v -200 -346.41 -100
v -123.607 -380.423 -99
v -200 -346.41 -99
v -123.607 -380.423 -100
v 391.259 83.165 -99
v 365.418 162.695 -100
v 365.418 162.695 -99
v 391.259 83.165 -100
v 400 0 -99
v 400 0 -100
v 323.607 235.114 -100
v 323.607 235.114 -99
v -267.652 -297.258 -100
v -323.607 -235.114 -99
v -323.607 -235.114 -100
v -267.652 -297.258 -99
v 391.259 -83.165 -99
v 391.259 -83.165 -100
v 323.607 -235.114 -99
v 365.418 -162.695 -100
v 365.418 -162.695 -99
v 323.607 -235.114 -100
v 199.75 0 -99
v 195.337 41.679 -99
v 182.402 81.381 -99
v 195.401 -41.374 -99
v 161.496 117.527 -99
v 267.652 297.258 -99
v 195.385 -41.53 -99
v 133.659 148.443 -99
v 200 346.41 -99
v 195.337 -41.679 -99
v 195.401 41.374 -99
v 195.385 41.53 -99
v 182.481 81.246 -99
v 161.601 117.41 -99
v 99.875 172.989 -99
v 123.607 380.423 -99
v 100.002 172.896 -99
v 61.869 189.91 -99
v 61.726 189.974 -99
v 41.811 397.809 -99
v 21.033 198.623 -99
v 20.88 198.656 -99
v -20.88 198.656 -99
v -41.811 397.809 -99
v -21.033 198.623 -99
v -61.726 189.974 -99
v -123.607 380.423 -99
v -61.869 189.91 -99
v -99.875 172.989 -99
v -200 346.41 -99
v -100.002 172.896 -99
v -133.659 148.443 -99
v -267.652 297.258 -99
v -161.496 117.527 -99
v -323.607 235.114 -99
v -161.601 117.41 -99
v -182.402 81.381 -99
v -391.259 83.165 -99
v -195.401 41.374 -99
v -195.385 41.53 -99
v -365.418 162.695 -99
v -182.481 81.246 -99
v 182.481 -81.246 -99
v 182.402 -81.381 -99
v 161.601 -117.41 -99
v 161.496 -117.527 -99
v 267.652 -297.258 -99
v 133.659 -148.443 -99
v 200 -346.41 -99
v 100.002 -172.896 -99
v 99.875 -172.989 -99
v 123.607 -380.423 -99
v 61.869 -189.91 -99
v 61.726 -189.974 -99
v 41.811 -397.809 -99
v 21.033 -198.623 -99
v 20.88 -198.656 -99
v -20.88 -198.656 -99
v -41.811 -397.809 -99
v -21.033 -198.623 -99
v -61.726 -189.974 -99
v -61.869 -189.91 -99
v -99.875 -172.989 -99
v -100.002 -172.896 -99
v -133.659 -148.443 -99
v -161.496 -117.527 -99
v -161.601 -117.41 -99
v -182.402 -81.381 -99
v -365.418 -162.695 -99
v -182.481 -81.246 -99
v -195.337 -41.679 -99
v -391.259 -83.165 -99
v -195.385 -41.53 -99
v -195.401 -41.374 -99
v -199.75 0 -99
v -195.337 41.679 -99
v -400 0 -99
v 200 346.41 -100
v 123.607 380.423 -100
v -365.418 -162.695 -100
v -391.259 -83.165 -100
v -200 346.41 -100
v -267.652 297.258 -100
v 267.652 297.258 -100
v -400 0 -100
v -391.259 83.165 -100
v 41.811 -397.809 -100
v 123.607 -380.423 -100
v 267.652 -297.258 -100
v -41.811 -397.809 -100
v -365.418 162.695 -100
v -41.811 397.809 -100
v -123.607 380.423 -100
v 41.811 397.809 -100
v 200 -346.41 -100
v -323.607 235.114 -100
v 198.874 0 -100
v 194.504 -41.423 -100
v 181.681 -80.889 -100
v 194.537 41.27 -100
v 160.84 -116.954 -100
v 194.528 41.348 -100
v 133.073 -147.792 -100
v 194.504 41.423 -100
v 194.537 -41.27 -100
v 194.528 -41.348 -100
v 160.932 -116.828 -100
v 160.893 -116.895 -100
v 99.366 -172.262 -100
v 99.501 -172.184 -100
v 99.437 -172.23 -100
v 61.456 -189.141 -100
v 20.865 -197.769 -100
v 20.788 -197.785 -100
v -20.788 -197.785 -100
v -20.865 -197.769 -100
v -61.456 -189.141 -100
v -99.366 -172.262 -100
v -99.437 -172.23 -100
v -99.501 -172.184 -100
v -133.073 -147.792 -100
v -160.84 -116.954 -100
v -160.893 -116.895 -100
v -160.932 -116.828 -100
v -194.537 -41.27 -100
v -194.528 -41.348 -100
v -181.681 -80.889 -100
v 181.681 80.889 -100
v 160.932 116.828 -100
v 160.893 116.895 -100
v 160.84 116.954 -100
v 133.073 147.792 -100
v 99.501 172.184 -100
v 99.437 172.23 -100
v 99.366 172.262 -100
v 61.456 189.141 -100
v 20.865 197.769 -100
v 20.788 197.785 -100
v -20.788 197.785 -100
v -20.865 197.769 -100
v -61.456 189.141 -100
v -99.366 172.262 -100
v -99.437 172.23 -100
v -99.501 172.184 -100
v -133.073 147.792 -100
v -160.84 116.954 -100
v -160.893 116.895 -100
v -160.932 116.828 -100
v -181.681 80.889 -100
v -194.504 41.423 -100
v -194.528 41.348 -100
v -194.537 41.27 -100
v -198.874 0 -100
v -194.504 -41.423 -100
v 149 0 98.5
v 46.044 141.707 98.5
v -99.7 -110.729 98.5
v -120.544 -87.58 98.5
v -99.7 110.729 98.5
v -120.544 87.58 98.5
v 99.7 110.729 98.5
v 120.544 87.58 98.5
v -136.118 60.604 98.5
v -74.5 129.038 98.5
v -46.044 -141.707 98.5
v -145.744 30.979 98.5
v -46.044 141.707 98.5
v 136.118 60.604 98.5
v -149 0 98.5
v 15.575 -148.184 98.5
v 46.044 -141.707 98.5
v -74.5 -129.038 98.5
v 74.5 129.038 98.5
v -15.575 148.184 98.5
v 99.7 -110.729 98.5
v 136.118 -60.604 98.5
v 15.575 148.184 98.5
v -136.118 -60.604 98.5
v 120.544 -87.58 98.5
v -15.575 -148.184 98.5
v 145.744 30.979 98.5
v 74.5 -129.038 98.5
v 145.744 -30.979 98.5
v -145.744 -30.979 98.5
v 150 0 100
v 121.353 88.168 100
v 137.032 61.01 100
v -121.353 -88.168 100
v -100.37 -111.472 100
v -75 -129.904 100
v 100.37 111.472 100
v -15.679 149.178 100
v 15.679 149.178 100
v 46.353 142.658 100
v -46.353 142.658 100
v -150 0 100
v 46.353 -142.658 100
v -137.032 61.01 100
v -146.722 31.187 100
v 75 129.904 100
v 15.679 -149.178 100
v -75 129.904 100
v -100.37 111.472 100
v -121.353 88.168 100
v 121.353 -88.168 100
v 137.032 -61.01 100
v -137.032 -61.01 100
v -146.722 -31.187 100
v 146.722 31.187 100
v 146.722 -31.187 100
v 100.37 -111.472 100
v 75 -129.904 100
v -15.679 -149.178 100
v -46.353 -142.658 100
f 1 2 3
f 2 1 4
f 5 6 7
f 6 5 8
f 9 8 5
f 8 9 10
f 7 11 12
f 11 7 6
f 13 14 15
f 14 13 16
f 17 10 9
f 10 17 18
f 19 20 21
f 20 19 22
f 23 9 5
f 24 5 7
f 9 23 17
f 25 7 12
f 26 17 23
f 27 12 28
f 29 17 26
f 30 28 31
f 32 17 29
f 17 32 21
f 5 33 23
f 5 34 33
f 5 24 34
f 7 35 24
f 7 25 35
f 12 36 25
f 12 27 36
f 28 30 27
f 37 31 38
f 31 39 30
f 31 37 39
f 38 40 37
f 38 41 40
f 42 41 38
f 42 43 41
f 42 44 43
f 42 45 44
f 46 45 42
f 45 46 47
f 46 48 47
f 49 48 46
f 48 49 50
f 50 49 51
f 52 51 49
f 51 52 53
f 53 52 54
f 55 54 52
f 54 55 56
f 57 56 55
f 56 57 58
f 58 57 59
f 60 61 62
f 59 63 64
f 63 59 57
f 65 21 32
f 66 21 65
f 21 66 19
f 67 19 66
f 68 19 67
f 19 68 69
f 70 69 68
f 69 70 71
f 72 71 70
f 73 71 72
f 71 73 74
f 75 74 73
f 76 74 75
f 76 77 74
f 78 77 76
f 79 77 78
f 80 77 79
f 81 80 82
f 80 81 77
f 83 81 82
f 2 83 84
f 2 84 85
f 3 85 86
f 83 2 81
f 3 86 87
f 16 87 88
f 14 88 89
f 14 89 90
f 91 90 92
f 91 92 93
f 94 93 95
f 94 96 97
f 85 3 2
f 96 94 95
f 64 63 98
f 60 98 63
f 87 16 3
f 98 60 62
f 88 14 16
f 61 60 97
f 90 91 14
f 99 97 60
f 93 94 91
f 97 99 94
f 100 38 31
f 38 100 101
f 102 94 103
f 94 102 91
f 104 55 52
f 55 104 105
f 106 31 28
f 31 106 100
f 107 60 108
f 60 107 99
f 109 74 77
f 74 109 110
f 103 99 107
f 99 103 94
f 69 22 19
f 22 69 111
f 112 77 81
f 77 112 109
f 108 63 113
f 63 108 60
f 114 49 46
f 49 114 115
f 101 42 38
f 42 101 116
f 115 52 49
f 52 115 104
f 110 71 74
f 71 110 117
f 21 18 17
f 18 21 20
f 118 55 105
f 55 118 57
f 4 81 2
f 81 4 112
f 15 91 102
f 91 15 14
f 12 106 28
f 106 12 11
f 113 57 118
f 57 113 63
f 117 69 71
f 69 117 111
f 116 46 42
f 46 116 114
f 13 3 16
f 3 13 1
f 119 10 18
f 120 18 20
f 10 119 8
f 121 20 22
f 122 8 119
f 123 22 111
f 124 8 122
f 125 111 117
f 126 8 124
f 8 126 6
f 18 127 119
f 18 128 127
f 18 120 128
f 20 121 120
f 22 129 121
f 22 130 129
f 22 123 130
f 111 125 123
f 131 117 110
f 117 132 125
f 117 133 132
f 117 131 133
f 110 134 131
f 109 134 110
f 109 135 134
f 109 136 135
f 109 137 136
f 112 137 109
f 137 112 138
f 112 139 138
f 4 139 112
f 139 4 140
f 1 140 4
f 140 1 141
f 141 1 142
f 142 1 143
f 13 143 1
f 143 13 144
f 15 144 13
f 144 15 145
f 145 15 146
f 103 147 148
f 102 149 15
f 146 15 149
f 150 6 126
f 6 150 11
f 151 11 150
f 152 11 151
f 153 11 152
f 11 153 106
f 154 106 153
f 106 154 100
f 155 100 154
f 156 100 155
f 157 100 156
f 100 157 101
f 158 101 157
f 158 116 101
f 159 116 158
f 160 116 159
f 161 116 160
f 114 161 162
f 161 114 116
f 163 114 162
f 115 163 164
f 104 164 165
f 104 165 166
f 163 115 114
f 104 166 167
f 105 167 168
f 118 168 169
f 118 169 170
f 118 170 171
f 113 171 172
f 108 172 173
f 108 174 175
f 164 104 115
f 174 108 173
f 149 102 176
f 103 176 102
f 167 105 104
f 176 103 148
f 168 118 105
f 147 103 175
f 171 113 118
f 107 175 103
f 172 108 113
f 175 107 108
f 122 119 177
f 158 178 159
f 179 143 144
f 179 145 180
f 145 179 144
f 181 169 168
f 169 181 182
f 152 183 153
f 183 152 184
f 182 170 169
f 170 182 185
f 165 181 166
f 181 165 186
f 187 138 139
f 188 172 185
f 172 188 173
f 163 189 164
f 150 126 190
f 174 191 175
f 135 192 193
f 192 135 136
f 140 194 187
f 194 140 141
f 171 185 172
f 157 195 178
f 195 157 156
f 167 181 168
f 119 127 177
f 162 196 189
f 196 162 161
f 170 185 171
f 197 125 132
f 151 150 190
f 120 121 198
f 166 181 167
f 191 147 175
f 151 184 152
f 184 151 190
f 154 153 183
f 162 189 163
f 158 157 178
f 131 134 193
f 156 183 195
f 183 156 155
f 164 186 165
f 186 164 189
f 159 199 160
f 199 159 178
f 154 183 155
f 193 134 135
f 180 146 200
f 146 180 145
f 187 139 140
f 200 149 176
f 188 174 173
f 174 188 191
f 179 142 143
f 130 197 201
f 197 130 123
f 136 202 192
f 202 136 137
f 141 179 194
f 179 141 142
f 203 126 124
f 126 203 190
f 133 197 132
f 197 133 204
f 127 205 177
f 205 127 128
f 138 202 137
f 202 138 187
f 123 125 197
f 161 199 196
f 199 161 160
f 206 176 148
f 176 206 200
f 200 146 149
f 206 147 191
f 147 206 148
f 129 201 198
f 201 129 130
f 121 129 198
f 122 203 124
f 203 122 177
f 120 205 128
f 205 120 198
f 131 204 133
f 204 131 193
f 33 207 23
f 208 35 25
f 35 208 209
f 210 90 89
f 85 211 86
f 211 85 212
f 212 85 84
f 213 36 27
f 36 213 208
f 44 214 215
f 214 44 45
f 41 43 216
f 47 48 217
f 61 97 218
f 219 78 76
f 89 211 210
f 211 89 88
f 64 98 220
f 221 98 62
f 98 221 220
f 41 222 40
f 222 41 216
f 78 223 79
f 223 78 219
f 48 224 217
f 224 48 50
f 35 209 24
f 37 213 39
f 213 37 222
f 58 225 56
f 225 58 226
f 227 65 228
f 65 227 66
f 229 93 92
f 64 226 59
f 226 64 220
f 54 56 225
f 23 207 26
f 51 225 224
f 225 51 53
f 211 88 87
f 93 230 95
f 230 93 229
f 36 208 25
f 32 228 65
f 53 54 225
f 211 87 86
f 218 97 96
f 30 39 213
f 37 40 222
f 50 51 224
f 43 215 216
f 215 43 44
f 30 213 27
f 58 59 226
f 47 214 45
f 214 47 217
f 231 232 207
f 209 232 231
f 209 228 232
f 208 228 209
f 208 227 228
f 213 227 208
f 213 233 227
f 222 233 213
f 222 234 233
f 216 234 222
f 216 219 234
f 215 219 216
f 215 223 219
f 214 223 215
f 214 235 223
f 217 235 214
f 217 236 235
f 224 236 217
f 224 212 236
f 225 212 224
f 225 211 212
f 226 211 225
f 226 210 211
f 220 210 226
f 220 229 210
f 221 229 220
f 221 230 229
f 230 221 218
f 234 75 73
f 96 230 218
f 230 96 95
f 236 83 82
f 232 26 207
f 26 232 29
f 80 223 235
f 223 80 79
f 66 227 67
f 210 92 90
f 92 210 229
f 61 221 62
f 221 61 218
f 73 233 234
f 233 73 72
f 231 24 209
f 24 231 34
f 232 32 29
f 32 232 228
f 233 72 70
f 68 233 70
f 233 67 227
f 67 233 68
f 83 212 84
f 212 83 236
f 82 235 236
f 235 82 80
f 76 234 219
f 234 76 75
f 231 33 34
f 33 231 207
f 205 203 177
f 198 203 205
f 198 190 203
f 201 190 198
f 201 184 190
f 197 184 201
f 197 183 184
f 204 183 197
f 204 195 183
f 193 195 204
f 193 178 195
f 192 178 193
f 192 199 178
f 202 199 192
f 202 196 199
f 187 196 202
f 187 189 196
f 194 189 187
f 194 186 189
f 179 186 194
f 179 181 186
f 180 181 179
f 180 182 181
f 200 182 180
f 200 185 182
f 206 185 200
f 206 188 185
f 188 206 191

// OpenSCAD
height=200;
bottomRadius=200;
topRadius=150;
width=1;
hatField=400;

module innerHat(){
    translate([0, 0, -width]){
            color("red")
            cylinder(h = height-width, r1 = bottomRadius-width, r2 = topRadius-width, center = true);
        }
}

module hat()
{
    difference() {
        color("green")
        translate([0, 0, (-height/2+width/2)])
        cylinder(h = width, r1 = hatField, r2 = hatField, center = true);
        innerHat();
    }
    
    difference() {
        cylinder(h = height, r1 = bottomRadius, r2 = topRadius, center = true);        
        innerHat();
    }
}

hat();
